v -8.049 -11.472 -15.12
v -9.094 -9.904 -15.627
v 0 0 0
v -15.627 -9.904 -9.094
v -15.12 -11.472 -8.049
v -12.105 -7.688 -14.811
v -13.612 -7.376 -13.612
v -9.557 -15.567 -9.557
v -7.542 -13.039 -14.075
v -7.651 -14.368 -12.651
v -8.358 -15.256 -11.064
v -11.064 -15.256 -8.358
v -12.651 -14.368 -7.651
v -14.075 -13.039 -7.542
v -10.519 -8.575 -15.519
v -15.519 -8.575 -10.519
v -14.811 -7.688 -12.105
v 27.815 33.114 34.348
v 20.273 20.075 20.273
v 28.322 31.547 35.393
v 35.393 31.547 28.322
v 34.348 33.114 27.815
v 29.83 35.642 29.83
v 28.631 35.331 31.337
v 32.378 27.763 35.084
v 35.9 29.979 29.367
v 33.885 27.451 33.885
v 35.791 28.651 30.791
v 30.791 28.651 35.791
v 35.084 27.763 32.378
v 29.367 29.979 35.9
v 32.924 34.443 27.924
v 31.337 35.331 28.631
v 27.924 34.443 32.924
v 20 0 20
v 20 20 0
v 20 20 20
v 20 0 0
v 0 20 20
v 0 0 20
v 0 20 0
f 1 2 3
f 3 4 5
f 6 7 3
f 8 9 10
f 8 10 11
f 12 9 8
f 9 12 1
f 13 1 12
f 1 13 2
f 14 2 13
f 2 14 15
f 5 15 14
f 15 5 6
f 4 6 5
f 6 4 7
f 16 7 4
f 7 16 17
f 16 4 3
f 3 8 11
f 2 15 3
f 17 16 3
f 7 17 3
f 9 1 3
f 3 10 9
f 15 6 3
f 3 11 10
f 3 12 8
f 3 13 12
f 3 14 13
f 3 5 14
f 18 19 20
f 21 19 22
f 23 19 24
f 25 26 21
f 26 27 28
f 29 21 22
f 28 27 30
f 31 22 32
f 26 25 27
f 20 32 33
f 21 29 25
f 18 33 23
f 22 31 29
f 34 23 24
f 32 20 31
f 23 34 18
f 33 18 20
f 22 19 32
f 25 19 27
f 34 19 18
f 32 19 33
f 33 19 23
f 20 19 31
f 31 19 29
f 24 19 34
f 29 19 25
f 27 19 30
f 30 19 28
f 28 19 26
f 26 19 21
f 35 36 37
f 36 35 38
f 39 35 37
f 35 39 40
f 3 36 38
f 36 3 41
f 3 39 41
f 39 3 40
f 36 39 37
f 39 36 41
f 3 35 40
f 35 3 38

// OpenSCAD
// file: measurement.scad
/*
   dist is along x
*/

module x_measurement_impl(dist)
{
  if ( dist >= 0){
     translate([-20,0,0]){
        rotate([0,90,0]){
            cylinder(r1 = 5, r2= 0, h = 20);
        }
     }
     translate([dist +20,0,0]){
        rotate([0,-90,0]){
            cylinder(r1 = 5, r2= 0, h = 20);
        }
     }
   } else{
     translate([20,0,0]){
        rotate([0,-90,0]){
            cylinder(r1 = 5, r2= 0, h = 20);
        }
     }
     translate([dist-20,0,0]){
        rotate([0,90,0]){
            cylinder(r2 = 0, r1= 5, h = 20);
        }
     }
   }
}

/*
   dist is along x, pos is 3d starting coord
*/

module x_measurement(dist, pos = [0,0,0])
{
   translate(pos){
     x_measurement_impl(dist);
   }
}

/*
   dist is along y, pos is 3d starting coord
*/
module y_measurement(dist, pos = [0,0,0])
{
   translate(pos){
      rotate([0,0,90]){
         x_measurement_impl(dist);
      }
   }
}

/*
   dist is along z, pos is 3d starting coord
*/

module z_measurement(dist, pos = [0,0,0])
{
   translate(pos){
      rotate([0,-90,0]){
         x_measurement_impl(dist);
      }
   }
}

//y_measurement(-5,[10,0,0]);
// main file
use <measurement.scad>

xangle = -35;
yangle = 45;
distance = 35;

cube([20,20,20]);

rotate([0,yangle,0])
  rotate([xangle,0,0])
    color("green")
      z_measurement(distance,[0,0,0]);
